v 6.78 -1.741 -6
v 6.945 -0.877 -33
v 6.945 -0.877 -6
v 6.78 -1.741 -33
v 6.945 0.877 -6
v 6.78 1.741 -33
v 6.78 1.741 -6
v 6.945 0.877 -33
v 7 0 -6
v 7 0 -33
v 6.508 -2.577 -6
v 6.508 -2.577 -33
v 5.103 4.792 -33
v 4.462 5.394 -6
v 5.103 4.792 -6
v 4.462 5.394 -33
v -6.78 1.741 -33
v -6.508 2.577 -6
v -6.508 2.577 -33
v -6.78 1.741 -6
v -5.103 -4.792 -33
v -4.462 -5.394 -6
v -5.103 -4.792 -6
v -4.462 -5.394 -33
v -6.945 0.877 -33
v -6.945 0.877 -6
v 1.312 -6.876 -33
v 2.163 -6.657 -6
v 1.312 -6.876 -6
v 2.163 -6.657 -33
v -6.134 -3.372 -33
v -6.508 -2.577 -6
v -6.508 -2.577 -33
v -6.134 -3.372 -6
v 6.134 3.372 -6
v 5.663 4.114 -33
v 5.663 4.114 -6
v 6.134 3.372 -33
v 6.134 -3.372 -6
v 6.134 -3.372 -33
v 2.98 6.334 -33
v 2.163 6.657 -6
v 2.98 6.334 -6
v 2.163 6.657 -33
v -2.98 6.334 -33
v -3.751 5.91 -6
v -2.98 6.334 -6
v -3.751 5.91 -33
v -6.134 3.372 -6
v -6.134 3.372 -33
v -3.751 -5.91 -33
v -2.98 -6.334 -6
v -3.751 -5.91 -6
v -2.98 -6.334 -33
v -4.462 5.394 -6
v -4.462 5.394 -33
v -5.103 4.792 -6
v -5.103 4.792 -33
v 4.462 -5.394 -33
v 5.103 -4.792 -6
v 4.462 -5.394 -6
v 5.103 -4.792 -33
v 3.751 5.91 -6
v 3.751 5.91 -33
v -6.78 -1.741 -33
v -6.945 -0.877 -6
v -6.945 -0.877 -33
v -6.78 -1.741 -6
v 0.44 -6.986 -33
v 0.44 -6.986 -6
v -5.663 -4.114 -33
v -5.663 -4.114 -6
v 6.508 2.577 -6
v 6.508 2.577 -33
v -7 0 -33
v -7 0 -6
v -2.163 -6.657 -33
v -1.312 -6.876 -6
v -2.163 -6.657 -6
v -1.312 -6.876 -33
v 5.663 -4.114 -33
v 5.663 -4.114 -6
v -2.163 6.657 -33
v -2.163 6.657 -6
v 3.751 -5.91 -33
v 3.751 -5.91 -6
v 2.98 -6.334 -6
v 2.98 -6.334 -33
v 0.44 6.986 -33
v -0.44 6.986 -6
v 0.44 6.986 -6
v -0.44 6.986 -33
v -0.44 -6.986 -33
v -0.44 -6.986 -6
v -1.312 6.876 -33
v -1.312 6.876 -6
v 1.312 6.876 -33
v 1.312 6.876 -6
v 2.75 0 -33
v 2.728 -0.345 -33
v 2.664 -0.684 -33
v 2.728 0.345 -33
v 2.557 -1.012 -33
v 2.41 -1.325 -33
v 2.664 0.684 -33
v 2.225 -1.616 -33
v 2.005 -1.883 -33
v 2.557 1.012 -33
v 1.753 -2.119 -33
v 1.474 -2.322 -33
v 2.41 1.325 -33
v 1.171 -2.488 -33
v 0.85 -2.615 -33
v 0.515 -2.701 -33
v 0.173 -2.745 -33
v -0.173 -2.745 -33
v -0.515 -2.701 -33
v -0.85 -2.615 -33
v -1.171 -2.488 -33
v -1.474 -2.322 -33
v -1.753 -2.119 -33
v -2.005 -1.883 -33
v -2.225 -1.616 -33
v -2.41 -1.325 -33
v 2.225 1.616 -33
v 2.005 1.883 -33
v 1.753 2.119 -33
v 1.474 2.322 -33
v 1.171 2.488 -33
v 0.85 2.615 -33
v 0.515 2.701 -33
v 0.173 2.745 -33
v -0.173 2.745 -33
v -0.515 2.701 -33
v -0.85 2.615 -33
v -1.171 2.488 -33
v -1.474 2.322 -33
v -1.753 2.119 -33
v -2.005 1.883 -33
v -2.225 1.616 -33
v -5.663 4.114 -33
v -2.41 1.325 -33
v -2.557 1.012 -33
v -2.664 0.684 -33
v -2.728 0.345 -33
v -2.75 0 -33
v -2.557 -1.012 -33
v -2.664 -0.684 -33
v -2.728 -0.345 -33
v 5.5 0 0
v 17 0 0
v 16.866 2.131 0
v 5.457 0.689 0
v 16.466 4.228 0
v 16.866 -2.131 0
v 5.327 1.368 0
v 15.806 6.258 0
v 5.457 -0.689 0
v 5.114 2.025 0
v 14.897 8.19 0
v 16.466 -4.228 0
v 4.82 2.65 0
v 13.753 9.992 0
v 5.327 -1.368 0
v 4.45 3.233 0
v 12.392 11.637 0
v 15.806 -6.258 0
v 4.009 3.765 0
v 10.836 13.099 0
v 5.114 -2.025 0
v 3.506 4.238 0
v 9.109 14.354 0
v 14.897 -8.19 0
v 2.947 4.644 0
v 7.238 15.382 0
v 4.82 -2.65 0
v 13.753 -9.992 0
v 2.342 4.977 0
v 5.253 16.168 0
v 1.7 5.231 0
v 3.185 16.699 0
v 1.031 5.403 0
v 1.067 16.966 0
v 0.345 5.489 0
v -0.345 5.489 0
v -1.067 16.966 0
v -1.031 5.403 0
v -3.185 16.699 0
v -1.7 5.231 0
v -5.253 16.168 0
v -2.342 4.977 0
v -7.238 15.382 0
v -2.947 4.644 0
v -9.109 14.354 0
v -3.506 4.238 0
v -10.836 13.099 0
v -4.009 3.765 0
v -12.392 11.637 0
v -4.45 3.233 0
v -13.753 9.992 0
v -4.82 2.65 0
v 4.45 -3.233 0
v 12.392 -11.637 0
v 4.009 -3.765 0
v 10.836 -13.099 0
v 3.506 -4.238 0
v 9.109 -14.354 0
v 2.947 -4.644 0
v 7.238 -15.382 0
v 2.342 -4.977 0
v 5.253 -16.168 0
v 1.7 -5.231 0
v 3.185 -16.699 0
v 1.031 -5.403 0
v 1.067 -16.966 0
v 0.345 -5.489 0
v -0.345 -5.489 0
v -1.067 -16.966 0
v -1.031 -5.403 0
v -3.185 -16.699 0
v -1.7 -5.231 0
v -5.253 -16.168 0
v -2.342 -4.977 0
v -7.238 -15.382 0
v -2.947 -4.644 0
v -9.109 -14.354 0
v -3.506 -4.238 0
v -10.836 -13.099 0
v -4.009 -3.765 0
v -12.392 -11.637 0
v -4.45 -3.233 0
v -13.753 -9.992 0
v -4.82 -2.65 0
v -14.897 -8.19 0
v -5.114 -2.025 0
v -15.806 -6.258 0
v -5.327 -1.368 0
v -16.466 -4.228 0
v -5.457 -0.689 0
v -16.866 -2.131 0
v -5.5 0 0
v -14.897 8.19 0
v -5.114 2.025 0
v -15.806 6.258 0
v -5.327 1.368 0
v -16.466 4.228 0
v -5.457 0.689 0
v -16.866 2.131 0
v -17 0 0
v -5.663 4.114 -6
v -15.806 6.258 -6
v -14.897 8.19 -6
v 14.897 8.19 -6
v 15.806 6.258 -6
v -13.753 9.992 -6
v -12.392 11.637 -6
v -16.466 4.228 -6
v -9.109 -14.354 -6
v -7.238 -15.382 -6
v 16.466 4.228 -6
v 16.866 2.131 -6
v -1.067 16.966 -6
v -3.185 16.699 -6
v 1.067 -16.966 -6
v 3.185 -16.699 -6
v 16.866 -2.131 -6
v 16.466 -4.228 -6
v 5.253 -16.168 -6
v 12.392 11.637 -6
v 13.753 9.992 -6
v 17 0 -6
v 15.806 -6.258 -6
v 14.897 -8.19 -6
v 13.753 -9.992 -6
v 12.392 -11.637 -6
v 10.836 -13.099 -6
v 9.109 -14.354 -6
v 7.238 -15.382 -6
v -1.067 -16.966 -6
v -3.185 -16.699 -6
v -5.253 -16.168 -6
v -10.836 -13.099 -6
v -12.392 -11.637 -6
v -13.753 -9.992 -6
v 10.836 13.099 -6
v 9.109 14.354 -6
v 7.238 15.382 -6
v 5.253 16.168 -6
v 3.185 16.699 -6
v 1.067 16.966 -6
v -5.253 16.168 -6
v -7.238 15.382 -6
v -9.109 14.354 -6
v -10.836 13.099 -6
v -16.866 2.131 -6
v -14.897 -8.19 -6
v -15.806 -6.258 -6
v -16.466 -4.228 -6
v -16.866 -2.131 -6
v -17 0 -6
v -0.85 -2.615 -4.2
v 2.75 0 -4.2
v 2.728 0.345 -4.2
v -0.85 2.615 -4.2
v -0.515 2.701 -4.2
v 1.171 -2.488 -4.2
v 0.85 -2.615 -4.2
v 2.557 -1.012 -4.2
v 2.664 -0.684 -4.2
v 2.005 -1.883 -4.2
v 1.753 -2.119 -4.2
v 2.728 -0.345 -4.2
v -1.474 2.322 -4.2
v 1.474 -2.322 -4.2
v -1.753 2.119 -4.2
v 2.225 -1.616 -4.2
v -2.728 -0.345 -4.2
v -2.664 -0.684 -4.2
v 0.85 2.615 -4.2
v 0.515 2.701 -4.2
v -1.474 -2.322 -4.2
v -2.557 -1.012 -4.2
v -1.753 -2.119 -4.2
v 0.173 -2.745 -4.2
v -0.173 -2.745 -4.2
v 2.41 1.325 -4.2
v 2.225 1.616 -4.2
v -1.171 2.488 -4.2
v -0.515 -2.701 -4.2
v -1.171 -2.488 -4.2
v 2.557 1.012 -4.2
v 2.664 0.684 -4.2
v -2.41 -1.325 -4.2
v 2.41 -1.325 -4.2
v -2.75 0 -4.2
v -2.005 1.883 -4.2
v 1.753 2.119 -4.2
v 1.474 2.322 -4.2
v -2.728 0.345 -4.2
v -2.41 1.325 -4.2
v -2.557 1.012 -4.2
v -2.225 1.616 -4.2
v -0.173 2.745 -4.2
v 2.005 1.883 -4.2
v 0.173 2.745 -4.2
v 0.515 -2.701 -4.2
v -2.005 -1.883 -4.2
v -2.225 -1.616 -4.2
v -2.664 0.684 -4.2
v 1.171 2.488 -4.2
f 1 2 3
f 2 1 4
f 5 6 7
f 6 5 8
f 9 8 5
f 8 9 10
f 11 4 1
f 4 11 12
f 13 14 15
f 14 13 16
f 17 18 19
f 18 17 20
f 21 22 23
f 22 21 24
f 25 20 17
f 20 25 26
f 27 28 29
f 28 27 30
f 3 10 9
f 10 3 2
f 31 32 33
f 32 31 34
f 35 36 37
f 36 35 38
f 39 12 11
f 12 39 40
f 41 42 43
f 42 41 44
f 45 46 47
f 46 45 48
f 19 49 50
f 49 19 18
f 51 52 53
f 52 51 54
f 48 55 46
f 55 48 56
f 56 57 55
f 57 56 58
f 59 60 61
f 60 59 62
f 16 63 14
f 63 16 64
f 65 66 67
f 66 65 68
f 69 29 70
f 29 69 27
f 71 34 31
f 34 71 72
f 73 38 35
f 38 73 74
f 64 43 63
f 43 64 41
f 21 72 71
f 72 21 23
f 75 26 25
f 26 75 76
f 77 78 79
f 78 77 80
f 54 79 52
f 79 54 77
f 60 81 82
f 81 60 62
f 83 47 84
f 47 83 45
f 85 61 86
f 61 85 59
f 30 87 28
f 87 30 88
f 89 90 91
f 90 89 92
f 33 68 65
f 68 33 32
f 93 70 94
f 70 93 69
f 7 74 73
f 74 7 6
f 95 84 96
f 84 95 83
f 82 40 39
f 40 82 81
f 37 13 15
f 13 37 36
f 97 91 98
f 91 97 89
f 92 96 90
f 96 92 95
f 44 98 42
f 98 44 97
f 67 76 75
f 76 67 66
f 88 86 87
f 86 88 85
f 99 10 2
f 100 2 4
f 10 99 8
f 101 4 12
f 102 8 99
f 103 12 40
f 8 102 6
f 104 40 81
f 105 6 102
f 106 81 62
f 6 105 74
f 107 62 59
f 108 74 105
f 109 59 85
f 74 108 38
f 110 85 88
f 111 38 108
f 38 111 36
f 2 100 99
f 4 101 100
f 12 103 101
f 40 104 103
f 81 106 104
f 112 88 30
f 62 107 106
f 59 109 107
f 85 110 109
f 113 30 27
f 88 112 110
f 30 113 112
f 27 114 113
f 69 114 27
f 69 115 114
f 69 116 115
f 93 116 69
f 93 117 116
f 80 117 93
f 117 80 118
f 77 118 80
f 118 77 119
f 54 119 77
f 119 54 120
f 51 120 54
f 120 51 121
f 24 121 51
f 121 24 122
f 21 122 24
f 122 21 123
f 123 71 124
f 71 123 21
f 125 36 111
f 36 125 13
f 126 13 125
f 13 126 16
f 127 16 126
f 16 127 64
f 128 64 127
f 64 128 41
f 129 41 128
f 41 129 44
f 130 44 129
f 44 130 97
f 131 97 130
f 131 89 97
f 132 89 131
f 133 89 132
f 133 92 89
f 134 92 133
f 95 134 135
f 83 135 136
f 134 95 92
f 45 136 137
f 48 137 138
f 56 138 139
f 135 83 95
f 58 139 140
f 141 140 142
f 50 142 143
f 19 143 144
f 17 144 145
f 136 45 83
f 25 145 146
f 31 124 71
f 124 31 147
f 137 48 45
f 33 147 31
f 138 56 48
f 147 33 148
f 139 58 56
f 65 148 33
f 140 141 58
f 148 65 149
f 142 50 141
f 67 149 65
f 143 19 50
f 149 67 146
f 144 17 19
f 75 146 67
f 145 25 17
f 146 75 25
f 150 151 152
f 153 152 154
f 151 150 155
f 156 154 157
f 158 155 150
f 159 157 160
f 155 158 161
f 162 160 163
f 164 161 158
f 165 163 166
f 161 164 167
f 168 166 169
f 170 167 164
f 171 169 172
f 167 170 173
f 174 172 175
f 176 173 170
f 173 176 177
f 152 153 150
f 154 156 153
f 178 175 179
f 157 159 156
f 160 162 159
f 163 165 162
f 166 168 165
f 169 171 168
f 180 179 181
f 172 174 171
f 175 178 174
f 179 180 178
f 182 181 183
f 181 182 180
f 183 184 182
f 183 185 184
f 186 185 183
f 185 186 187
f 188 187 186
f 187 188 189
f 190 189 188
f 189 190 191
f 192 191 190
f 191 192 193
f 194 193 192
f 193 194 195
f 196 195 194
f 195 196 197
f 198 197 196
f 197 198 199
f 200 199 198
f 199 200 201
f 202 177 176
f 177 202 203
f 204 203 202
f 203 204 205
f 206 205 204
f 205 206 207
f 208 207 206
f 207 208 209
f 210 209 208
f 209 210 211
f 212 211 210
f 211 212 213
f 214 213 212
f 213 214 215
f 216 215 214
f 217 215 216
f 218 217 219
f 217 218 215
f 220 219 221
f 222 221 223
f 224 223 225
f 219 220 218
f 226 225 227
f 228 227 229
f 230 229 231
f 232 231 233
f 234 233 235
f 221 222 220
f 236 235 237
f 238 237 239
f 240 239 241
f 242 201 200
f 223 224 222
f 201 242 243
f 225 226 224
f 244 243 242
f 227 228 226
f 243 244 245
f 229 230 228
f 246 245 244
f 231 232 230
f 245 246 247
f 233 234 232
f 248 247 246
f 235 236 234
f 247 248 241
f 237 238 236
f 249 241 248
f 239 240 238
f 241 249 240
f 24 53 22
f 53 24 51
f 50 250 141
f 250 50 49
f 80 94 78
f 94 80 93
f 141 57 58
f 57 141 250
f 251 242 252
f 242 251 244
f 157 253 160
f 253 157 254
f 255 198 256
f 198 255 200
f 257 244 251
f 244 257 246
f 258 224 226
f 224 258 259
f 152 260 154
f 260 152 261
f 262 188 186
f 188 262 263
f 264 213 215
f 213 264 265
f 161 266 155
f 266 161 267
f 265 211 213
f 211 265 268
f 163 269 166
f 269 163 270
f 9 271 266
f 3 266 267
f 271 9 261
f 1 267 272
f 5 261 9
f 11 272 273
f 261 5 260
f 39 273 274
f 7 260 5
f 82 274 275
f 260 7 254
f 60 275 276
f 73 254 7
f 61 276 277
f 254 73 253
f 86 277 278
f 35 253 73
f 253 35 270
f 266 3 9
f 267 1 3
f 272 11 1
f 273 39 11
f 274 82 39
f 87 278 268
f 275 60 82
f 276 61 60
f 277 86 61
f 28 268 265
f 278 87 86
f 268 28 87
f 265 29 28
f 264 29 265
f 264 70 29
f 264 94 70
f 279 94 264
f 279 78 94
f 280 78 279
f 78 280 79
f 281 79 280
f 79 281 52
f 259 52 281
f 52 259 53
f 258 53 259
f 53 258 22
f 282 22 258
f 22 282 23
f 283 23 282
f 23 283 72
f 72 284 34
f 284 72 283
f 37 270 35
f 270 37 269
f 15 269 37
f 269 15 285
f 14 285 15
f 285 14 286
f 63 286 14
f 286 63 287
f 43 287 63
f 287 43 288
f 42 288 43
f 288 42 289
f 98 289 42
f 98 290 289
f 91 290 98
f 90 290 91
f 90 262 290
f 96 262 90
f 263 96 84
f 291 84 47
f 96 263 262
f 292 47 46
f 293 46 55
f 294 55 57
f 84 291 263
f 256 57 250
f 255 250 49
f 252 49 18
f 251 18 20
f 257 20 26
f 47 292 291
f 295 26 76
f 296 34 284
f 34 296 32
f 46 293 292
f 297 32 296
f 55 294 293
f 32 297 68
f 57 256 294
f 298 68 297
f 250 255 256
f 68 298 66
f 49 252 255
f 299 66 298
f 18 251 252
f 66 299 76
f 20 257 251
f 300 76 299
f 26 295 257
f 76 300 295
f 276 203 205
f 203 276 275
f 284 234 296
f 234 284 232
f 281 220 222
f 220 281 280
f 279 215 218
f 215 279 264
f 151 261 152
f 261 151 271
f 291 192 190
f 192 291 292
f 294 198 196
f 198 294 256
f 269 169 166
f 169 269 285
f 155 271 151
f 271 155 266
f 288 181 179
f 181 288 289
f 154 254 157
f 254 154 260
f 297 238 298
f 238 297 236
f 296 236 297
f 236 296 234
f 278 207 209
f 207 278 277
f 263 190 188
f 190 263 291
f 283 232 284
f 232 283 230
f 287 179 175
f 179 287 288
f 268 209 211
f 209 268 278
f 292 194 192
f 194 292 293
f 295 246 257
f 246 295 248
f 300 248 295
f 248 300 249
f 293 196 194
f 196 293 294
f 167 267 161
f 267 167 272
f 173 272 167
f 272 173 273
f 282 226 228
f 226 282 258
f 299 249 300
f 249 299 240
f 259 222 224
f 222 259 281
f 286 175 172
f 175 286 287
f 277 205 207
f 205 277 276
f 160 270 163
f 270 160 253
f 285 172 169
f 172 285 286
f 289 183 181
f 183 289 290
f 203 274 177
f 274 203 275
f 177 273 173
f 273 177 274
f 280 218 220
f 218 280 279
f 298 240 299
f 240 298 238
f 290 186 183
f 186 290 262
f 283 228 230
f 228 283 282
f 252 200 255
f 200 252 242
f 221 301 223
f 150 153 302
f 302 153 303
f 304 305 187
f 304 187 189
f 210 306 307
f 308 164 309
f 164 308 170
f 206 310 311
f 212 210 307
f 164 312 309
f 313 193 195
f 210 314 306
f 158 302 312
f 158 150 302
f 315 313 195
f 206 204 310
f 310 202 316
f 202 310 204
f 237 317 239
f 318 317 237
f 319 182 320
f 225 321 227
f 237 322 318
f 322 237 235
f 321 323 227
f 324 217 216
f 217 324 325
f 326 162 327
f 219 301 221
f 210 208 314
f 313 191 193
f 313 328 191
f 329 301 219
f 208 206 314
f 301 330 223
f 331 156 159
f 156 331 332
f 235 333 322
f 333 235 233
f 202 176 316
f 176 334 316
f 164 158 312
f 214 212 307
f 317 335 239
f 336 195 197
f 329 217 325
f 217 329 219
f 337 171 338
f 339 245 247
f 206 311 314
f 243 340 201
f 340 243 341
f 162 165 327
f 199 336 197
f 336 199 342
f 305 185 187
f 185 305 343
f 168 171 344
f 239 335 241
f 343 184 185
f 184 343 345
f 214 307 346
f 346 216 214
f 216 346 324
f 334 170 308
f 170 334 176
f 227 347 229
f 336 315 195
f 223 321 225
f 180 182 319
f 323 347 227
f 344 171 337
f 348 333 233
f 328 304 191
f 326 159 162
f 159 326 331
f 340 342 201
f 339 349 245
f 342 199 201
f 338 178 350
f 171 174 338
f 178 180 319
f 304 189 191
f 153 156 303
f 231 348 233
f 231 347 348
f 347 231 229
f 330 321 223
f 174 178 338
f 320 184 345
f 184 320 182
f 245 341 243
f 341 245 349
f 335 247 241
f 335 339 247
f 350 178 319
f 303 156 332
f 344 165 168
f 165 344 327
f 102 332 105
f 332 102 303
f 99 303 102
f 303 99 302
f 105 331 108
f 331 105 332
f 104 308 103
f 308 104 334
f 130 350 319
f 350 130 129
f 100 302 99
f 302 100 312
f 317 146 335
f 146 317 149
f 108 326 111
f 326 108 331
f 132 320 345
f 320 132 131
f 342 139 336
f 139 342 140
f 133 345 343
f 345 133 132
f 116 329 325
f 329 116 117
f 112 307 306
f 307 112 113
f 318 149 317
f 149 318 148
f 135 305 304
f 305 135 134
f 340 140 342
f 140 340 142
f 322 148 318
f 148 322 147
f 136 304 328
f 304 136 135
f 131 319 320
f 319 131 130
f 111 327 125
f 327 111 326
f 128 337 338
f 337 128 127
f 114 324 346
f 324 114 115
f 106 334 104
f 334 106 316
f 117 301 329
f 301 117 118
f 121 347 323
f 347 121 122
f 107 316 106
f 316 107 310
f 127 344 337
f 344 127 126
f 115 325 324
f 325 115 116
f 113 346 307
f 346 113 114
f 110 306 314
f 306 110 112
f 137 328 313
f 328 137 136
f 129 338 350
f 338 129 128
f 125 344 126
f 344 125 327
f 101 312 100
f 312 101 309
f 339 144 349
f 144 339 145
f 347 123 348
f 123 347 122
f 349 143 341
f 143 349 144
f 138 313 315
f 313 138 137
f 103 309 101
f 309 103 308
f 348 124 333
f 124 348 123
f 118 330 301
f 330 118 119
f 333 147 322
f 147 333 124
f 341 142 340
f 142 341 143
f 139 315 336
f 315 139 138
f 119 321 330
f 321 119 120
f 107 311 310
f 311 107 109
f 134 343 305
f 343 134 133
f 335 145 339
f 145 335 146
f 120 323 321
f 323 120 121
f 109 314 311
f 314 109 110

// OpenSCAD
$fn = 50;


difference() {
	union() {
		translate(v = [0, 0, -33.0000000000]) {
			cylinder(h = 33, r = 7.0000000000);
		}
		translate(v = [0, 0, -6.0000000000]) {
			cylinder(h = 6, r = 17.0000000000);
		}
	}
	union() {
		translate(v = [0, 0, 0]) {
			rotate(a = [0, 0, 0]) {
				difference() {
					union() {
						#translate(v = [0, 0, -33.0000000000]) {
							cylinder(h = 33, r = 2.2500000000);
						}
						#translate(v = [0, 0, -4.2000000000]) {
							cylinder(h = 4.2000000000, r1 = 2.7500000000, r2 = 5.5000000000);
						}
						#translate(v = [0, 0, -33.0000000000]) {
							cylinder(h = 33, r = 2.7500000000);
						}
						#translate(v = [0, 0, -33.0000000000]) {
							cylinder(h = 33, r = 2.2500000000);
						}
					}
					union();
				}
			}
		}
	}
}
